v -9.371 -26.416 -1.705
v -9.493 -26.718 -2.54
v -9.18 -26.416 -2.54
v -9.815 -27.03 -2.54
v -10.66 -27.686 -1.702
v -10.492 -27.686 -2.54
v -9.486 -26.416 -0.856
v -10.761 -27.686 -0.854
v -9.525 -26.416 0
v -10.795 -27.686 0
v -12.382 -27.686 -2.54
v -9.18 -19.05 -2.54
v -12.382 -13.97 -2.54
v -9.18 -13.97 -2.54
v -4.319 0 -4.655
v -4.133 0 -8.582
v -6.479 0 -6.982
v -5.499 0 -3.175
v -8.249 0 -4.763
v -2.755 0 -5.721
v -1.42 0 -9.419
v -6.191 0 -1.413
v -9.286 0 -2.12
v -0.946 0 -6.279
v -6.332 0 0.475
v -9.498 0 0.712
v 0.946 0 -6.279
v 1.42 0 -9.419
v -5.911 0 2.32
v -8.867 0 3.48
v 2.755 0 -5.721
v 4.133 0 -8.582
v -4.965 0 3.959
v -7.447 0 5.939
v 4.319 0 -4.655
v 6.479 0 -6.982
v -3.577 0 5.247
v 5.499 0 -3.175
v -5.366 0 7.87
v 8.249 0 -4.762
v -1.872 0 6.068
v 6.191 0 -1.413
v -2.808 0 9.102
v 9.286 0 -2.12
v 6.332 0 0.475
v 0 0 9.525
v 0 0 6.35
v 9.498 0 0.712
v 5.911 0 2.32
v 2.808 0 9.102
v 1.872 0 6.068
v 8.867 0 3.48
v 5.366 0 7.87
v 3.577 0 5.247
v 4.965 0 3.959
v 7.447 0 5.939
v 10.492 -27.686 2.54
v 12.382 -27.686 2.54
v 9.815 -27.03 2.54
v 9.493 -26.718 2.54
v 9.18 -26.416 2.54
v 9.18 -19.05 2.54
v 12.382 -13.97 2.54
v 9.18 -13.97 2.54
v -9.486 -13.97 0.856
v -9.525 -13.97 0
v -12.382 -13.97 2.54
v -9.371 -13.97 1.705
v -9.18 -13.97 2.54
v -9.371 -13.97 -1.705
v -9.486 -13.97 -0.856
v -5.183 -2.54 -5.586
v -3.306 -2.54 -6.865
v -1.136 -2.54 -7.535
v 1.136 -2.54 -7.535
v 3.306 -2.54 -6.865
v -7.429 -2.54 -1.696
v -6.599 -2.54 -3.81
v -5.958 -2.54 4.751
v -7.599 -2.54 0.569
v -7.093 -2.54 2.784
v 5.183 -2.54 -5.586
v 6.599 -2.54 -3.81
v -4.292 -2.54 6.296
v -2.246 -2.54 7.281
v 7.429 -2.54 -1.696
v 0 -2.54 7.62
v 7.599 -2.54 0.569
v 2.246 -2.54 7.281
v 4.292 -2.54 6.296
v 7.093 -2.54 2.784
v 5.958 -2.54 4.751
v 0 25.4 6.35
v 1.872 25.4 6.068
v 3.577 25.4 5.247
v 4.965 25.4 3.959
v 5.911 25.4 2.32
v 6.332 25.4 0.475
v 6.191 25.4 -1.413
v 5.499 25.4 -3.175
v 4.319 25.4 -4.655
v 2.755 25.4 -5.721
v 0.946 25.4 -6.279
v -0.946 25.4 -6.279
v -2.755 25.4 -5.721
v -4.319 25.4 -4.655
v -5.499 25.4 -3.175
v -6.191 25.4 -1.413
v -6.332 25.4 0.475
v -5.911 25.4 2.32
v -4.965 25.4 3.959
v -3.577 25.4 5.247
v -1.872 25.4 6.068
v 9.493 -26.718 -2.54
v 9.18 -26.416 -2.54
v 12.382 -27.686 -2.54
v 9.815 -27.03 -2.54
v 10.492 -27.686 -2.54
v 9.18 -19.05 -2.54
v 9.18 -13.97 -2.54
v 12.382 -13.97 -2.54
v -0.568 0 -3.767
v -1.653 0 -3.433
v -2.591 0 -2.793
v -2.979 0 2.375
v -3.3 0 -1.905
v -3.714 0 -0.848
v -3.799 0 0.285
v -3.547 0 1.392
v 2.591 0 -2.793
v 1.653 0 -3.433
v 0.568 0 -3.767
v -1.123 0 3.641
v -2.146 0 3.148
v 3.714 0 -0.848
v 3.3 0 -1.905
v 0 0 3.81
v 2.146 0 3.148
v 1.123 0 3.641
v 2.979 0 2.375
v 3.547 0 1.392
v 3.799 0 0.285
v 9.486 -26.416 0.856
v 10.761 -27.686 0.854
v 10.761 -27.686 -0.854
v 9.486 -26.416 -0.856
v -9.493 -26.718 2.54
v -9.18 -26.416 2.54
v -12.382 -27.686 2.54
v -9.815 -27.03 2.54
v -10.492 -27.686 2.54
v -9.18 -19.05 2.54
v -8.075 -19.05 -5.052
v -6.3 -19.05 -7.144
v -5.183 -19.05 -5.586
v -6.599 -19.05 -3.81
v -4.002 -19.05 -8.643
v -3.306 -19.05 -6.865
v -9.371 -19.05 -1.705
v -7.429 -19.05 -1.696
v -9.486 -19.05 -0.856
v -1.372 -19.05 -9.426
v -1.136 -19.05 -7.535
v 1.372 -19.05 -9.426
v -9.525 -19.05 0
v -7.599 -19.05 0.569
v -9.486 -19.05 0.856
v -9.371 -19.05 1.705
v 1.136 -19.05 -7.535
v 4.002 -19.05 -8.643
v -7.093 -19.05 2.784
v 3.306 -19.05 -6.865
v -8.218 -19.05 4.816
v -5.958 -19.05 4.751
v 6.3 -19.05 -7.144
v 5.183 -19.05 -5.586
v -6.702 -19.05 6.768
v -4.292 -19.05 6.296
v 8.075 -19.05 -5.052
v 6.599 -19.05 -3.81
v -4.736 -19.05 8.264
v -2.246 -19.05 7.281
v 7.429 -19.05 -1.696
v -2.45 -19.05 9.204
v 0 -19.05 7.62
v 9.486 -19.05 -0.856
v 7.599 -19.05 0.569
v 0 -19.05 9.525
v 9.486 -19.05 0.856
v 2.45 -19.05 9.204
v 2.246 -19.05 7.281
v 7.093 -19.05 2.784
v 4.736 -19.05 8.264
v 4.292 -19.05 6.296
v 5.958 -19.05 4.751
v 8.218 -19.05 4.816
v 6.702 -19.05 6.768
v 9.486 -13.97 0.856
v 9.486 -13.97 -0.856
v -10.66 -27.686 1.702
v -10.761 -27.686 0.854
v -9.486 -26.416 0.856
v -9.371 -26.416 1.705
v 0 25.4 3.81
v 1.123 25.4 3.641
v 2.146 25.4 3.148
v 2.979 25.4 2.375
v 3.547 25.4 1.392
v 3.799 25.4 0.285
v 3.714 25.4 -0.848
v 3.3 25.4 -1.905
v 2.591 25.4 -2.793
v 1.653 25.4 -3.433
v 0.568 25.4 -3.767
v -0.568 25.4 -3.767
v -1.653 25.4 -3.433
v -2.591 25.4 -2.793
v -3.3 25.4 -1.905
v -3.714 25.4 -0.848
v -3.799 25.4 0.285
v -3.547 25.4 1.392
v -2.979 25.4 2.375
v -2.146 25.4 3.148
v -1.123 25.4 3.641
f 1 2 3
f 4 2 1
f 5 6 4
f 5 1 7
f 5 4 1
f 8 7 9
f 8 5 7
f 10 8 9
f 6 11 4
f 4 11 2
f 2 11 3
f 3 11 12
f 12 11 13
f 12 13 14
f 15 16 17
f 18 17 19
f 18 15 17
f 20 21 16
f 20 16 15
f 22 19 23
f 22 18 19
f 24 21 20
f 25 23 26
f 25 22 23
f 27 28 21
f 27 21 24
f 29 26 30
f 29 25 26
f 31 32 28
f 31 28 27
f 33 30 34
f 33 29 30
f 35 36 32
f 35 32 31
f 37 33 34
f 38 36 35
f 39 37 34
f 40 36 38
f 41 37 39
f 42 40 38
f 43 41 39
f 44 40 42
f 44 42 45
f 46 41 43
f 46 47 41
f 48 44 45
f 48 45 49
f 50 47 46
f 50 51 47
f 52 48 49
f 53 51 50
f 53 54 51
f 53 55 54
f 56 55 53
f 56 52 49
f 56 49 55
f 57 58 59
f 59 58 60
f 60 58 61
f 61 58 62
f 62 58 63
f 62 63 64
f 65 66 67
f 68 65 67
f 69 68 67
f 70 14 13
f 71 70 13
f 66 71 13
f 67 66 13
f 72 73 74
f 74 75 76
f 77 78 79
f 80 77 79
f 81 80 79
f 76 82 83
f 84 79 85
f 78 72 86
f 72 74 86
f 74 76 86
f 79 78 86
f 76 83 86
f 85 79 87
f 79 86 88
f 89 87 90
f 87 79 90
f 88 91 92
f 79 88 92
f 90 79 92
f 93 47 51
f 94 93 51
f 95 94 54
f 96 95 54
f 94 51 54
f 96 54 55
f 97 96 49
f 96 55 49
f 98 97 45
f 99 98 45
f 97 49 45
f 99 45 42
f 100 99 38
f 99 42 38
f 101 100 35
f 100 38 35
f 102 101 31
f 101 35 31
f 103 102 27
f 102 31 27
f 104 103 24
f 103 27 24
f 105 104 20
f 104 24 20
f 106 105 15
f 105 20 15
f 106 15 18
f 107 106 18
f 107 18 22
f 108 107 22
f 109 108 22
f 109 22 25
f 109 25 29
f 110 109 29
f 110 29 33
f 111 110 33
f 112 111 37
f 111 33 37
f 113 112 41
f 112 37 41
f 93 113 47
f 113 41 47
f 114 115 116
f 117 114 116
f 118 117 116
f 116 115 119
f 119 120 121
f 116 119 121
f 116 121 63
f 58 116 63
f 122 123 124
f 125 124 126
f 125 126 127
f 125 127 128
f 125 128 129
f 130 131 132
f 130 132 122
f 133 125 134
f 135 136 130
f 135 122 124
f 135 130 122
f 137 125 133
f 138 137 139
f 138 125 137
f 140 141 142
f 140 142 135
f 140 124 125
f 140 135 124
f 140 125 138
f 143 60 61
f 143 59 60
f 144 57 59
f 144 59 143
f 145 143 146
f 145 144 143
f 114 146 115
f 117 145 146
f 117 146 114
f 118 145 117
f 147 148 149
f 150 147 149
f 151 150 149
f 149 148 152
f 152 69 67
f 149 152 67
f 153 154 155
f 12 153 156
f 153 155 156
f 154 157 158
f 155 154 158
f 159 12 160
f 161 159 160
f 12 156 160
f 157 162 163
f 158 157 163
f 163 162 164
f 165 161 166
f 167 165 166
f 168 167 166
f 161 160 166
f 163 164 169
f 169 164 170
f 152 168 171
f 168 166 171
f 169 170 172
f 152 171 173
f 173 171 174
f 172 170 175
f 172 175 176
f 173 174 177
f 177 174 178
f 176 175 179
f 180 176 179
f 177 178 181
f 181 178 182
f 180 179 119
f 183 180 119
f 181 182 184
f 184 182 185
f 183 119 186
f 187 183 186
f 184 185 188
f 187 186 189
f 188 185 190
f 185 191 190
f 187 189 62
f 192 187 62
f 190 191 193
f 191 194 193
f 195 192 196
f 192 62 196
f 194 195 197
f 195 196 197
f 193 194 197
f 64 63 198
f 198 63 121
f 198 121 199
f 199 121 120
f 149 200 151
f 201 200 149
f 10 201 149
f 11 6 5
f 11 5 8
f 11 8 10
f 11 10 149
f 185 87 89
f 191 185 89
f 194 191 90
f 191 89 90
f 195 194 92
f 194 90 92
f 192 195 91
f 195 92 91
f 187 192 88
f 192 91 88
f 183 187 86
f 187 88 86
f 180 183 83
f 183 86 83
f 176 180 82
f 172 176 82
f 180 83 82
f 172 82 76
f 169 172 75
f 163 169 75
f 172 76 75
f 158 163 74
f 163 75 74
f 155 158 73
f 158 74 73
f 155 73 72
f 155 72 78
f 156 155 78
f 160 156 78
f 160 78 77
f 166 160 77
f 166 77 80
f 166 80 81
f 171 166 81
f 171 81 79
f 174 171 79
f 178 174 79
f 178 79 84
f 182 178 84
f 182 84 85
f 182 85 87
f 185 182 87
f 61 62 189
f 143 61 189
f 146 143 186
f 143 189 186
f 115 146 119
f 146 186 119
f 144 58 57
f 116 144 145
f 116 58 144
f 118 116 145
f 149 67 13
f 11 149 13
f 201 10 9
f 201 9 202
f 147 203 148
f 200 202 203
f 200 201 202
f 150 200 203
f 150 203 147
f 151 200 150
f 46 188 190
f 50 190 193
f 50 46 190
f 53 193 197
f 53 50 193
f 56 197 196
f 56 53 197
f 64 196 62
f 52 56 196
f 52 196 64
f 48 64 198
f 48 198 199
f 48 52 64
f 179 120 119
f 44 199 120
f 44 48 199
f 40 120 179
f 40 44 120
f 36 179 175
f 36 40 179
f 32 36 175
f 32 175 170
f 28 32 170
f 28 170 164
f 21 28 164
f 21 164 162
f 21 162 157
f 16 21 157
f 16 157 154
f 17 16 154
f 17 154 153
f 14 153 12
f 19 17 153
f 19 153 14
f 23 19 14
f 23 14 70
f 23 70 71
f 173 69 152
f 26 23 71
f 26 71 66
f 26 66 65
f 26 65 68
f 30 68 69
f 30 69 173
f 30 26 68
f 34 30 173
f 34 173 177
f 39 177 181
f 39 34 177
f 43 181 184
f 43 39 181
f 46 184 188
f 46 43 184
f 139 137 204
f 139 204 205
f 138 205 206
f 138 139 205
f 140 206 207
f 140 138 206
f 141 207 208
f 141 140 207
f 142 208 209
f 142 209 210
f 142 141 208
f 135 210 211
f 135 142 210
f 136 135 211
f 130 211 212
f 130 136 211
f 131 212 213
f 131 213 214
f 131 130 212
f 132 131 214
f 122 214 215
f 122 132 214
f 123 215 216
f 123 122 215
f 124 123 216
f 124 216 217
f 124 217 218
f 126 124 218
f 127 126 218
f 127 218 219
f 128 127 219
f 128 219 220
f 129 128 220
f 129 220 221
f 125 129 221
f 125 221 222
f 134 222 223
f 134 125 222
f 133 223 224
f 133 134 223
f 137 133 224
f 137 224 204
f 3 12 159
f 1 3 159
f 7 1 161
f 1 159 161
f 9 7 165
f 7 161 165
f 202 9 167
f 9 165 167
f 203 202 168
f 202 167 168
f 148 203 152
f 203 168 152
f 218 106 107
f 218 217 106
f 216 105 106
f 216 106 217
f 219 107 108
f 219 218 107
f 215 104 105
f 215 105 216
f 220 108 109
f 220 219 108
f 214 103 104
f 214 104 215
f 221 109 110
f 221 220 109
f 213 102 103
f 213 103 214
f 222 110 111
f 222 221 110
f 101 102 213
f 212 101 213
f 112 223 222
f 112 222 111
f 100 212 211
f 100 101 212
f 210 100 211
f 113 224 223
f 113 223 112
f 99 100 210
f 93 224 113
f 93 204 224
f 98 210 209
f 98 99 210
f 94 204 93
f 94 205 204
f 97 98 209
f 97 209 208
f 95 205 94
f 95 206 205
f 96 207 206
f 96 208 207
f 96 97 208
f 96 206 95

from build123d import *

# Parameters (mm, degrees)
PIN_R                     = 6.35
PIN_R_2                   = 3.81
BOSS_EXTRUDE4_DEPTH       = 25.4
HOLLOW_CYL_R              = 9.525
HOLLOW_CYL_R_2            = 7.62
BOSS_EXTRUDE5_DEPTH       = 19.05
SKETCH4_R                 = 7.62
BOSS_EXTRUDE7_DEPTH       = 2.54
BOSS_EXTRUDE9_DEPTH       = 7.62
BOSS_EXTRUDE9_2_DEPTH     = 7.62
BOSS_EXTRUDE10_DEPTH      = 8.636
BOSS_EXTRUDE10_DEPTH_BACK = 5.08
CHAMFER2_SIZE             = 1.27
CHAMFER4_SIZE             = 1.27


with BuildPart() as part:
    # Pin → Boss-Extrude4 (new body)
    with BuildSketch(Plane(origin=(0, 0, 0), x_dir=(1, 0, 0), z_dir=(0, 1, 0))):
        Circle(PIN_R)
        Circle(PIN_R_2, mode=Mode.SUBTRACT)
    extrude(amount=BOSS_EXTRUDE4_DEPTH)



with BuildPart() as body_2:
    # Hollow Cyl → Boss-Extrude5 (new body)
    with BuildSketch(Plane(origin=(0, 0, 0), x_dir=(1, 0, 0), z_dir=(0, 1, 0))):
        Circle(HOLLOW_CYL_R)
        Circle(HOLLOW_CYL_R_2, mode=Mode.SUBTRACT)
    extrude(amount=-BOSS_EXTRUDE5_DEPTH)


with BuildPart() as part_1:
    add(part.part)

    add(body_2.part)  # Boss-Extrude7 merges body 2
    # Sketch4 → Boss-Extrude7 (add)
    with BuildSketch(Plane(origin=(0, 0, 0), x_dir=(1, 0, 0), z_dir=(0, 1, 0))):
        Circle(SKETCH4_R)
    extrude(amount=-BOSS_EXTRUDE7_DEPTH)



with BuildPart() as body_2_2:
    # Sketch6 → Boss-Extrude9 (new body)
    with BuildSketch(Plane(origin=(0, -19.05, 0), x_dir=(-1, 0, 0), z_dir=(0, -1, 0))):
        with BuildLine():
            Line((9.180088507, -2.54), (12.3825, -2.54))
            Line((12.3825, -2.54), (12.3825, 2.54))
            Line((12.3825, 2.54), (9.180088507, 2.54))
            ThreePointArc((9.180088507, 2.54), (9.525, 0), (9.180088507, -2.54))
        make_face()
    extrude(amount=BOSS_EXTRUDE9_DEPTH)


with BuildPart() as body_3:
    # Sketch6 → Boss-Extrude9 2 (new body)
    with BuildSketch(Plane(origin=(0, -19.05, 0), x_dir=(-1, 0, 0), z_dir=(0, -1, 0))):
        with BuildLine():
            Line((-12.3825, -2.54), (-9.180088507, -2.54))
            ThreePointArc((-9.180088507, -2.54), (-9.525, 0), (-9.180088507, 2.54))
            Line((-9.180088507, 2.54), (-12.3825, 2.54))
            Line((-12.3825, 2.54), (-12.3825, -2.54))
        make_face()
    extrude(amount=BOSS_EXTRUDE9_2_DEPTH)


with BuildPart() as part_2:
    add(part_1.part)

    add(body_2_2.part)  # Boss-Extrude10 merges body 2 2

    add(body_3.part)  # Boss-Extrude10 merges body 3
    # Sketch6<5> → Boss-Extrude10 (add, two sides: drawn at the far end of the back side and taken through both)
    with BuildSketch(Plane(origin=(0, -19.05, 0), x_dir=(-1, 0, 0), z_dir=(0, -1, 0)).offset(-BOSS_EXTRUDE10_DEPTH_BACK)):
        with BuildLine():
            Line((9.180088507, -2.54), (12.3825, -2.54))
            Line((12.3825, -2.54), (12.3825, 2.54))
            Line((12.3825, 2.54), (9.180088507, 2.54))
            ThreePointArc((9.180088507, 2.54), (9.525, 0), (9.180088507, -2.54))
        make_face()
        with BuildLine():
            Line((-12.3825, -2.54), (-9.180088507, -2.54))
            ThreePointArc((-9.180088507, -2.54), (-9.525, 0), (-9.180088507, 2.54))
            Line((-9.180088507, 2.54), (-12.3825, 2.54))
            Line((-12.3825, 2.54), (-12.3825, -2.54))
        make_face()
    extrude(amount=BOSS_EXTRUDE10_DEPTH + BOSS_EXTRUDE10_DEPTH_BACK)

    # Chamfer2
    chamfer2_edges = [part_2.edges().sort_by_distance(p)[0] for p in [
        (9.525, -27.686, 0),
    ]]
    chamfer(chamfer2_edges, length=CHAMFER2_SIZE)

    # Chamfer4
    chamfer4_edges = [part_2.edges().sort_by_distance(p)[0] for p in [
        (-9.525, -27.686, 0),
    ]]
    chamfer(chamfer4_edges, length=CHAMFER4_SIZE)


solid = part_2.part
